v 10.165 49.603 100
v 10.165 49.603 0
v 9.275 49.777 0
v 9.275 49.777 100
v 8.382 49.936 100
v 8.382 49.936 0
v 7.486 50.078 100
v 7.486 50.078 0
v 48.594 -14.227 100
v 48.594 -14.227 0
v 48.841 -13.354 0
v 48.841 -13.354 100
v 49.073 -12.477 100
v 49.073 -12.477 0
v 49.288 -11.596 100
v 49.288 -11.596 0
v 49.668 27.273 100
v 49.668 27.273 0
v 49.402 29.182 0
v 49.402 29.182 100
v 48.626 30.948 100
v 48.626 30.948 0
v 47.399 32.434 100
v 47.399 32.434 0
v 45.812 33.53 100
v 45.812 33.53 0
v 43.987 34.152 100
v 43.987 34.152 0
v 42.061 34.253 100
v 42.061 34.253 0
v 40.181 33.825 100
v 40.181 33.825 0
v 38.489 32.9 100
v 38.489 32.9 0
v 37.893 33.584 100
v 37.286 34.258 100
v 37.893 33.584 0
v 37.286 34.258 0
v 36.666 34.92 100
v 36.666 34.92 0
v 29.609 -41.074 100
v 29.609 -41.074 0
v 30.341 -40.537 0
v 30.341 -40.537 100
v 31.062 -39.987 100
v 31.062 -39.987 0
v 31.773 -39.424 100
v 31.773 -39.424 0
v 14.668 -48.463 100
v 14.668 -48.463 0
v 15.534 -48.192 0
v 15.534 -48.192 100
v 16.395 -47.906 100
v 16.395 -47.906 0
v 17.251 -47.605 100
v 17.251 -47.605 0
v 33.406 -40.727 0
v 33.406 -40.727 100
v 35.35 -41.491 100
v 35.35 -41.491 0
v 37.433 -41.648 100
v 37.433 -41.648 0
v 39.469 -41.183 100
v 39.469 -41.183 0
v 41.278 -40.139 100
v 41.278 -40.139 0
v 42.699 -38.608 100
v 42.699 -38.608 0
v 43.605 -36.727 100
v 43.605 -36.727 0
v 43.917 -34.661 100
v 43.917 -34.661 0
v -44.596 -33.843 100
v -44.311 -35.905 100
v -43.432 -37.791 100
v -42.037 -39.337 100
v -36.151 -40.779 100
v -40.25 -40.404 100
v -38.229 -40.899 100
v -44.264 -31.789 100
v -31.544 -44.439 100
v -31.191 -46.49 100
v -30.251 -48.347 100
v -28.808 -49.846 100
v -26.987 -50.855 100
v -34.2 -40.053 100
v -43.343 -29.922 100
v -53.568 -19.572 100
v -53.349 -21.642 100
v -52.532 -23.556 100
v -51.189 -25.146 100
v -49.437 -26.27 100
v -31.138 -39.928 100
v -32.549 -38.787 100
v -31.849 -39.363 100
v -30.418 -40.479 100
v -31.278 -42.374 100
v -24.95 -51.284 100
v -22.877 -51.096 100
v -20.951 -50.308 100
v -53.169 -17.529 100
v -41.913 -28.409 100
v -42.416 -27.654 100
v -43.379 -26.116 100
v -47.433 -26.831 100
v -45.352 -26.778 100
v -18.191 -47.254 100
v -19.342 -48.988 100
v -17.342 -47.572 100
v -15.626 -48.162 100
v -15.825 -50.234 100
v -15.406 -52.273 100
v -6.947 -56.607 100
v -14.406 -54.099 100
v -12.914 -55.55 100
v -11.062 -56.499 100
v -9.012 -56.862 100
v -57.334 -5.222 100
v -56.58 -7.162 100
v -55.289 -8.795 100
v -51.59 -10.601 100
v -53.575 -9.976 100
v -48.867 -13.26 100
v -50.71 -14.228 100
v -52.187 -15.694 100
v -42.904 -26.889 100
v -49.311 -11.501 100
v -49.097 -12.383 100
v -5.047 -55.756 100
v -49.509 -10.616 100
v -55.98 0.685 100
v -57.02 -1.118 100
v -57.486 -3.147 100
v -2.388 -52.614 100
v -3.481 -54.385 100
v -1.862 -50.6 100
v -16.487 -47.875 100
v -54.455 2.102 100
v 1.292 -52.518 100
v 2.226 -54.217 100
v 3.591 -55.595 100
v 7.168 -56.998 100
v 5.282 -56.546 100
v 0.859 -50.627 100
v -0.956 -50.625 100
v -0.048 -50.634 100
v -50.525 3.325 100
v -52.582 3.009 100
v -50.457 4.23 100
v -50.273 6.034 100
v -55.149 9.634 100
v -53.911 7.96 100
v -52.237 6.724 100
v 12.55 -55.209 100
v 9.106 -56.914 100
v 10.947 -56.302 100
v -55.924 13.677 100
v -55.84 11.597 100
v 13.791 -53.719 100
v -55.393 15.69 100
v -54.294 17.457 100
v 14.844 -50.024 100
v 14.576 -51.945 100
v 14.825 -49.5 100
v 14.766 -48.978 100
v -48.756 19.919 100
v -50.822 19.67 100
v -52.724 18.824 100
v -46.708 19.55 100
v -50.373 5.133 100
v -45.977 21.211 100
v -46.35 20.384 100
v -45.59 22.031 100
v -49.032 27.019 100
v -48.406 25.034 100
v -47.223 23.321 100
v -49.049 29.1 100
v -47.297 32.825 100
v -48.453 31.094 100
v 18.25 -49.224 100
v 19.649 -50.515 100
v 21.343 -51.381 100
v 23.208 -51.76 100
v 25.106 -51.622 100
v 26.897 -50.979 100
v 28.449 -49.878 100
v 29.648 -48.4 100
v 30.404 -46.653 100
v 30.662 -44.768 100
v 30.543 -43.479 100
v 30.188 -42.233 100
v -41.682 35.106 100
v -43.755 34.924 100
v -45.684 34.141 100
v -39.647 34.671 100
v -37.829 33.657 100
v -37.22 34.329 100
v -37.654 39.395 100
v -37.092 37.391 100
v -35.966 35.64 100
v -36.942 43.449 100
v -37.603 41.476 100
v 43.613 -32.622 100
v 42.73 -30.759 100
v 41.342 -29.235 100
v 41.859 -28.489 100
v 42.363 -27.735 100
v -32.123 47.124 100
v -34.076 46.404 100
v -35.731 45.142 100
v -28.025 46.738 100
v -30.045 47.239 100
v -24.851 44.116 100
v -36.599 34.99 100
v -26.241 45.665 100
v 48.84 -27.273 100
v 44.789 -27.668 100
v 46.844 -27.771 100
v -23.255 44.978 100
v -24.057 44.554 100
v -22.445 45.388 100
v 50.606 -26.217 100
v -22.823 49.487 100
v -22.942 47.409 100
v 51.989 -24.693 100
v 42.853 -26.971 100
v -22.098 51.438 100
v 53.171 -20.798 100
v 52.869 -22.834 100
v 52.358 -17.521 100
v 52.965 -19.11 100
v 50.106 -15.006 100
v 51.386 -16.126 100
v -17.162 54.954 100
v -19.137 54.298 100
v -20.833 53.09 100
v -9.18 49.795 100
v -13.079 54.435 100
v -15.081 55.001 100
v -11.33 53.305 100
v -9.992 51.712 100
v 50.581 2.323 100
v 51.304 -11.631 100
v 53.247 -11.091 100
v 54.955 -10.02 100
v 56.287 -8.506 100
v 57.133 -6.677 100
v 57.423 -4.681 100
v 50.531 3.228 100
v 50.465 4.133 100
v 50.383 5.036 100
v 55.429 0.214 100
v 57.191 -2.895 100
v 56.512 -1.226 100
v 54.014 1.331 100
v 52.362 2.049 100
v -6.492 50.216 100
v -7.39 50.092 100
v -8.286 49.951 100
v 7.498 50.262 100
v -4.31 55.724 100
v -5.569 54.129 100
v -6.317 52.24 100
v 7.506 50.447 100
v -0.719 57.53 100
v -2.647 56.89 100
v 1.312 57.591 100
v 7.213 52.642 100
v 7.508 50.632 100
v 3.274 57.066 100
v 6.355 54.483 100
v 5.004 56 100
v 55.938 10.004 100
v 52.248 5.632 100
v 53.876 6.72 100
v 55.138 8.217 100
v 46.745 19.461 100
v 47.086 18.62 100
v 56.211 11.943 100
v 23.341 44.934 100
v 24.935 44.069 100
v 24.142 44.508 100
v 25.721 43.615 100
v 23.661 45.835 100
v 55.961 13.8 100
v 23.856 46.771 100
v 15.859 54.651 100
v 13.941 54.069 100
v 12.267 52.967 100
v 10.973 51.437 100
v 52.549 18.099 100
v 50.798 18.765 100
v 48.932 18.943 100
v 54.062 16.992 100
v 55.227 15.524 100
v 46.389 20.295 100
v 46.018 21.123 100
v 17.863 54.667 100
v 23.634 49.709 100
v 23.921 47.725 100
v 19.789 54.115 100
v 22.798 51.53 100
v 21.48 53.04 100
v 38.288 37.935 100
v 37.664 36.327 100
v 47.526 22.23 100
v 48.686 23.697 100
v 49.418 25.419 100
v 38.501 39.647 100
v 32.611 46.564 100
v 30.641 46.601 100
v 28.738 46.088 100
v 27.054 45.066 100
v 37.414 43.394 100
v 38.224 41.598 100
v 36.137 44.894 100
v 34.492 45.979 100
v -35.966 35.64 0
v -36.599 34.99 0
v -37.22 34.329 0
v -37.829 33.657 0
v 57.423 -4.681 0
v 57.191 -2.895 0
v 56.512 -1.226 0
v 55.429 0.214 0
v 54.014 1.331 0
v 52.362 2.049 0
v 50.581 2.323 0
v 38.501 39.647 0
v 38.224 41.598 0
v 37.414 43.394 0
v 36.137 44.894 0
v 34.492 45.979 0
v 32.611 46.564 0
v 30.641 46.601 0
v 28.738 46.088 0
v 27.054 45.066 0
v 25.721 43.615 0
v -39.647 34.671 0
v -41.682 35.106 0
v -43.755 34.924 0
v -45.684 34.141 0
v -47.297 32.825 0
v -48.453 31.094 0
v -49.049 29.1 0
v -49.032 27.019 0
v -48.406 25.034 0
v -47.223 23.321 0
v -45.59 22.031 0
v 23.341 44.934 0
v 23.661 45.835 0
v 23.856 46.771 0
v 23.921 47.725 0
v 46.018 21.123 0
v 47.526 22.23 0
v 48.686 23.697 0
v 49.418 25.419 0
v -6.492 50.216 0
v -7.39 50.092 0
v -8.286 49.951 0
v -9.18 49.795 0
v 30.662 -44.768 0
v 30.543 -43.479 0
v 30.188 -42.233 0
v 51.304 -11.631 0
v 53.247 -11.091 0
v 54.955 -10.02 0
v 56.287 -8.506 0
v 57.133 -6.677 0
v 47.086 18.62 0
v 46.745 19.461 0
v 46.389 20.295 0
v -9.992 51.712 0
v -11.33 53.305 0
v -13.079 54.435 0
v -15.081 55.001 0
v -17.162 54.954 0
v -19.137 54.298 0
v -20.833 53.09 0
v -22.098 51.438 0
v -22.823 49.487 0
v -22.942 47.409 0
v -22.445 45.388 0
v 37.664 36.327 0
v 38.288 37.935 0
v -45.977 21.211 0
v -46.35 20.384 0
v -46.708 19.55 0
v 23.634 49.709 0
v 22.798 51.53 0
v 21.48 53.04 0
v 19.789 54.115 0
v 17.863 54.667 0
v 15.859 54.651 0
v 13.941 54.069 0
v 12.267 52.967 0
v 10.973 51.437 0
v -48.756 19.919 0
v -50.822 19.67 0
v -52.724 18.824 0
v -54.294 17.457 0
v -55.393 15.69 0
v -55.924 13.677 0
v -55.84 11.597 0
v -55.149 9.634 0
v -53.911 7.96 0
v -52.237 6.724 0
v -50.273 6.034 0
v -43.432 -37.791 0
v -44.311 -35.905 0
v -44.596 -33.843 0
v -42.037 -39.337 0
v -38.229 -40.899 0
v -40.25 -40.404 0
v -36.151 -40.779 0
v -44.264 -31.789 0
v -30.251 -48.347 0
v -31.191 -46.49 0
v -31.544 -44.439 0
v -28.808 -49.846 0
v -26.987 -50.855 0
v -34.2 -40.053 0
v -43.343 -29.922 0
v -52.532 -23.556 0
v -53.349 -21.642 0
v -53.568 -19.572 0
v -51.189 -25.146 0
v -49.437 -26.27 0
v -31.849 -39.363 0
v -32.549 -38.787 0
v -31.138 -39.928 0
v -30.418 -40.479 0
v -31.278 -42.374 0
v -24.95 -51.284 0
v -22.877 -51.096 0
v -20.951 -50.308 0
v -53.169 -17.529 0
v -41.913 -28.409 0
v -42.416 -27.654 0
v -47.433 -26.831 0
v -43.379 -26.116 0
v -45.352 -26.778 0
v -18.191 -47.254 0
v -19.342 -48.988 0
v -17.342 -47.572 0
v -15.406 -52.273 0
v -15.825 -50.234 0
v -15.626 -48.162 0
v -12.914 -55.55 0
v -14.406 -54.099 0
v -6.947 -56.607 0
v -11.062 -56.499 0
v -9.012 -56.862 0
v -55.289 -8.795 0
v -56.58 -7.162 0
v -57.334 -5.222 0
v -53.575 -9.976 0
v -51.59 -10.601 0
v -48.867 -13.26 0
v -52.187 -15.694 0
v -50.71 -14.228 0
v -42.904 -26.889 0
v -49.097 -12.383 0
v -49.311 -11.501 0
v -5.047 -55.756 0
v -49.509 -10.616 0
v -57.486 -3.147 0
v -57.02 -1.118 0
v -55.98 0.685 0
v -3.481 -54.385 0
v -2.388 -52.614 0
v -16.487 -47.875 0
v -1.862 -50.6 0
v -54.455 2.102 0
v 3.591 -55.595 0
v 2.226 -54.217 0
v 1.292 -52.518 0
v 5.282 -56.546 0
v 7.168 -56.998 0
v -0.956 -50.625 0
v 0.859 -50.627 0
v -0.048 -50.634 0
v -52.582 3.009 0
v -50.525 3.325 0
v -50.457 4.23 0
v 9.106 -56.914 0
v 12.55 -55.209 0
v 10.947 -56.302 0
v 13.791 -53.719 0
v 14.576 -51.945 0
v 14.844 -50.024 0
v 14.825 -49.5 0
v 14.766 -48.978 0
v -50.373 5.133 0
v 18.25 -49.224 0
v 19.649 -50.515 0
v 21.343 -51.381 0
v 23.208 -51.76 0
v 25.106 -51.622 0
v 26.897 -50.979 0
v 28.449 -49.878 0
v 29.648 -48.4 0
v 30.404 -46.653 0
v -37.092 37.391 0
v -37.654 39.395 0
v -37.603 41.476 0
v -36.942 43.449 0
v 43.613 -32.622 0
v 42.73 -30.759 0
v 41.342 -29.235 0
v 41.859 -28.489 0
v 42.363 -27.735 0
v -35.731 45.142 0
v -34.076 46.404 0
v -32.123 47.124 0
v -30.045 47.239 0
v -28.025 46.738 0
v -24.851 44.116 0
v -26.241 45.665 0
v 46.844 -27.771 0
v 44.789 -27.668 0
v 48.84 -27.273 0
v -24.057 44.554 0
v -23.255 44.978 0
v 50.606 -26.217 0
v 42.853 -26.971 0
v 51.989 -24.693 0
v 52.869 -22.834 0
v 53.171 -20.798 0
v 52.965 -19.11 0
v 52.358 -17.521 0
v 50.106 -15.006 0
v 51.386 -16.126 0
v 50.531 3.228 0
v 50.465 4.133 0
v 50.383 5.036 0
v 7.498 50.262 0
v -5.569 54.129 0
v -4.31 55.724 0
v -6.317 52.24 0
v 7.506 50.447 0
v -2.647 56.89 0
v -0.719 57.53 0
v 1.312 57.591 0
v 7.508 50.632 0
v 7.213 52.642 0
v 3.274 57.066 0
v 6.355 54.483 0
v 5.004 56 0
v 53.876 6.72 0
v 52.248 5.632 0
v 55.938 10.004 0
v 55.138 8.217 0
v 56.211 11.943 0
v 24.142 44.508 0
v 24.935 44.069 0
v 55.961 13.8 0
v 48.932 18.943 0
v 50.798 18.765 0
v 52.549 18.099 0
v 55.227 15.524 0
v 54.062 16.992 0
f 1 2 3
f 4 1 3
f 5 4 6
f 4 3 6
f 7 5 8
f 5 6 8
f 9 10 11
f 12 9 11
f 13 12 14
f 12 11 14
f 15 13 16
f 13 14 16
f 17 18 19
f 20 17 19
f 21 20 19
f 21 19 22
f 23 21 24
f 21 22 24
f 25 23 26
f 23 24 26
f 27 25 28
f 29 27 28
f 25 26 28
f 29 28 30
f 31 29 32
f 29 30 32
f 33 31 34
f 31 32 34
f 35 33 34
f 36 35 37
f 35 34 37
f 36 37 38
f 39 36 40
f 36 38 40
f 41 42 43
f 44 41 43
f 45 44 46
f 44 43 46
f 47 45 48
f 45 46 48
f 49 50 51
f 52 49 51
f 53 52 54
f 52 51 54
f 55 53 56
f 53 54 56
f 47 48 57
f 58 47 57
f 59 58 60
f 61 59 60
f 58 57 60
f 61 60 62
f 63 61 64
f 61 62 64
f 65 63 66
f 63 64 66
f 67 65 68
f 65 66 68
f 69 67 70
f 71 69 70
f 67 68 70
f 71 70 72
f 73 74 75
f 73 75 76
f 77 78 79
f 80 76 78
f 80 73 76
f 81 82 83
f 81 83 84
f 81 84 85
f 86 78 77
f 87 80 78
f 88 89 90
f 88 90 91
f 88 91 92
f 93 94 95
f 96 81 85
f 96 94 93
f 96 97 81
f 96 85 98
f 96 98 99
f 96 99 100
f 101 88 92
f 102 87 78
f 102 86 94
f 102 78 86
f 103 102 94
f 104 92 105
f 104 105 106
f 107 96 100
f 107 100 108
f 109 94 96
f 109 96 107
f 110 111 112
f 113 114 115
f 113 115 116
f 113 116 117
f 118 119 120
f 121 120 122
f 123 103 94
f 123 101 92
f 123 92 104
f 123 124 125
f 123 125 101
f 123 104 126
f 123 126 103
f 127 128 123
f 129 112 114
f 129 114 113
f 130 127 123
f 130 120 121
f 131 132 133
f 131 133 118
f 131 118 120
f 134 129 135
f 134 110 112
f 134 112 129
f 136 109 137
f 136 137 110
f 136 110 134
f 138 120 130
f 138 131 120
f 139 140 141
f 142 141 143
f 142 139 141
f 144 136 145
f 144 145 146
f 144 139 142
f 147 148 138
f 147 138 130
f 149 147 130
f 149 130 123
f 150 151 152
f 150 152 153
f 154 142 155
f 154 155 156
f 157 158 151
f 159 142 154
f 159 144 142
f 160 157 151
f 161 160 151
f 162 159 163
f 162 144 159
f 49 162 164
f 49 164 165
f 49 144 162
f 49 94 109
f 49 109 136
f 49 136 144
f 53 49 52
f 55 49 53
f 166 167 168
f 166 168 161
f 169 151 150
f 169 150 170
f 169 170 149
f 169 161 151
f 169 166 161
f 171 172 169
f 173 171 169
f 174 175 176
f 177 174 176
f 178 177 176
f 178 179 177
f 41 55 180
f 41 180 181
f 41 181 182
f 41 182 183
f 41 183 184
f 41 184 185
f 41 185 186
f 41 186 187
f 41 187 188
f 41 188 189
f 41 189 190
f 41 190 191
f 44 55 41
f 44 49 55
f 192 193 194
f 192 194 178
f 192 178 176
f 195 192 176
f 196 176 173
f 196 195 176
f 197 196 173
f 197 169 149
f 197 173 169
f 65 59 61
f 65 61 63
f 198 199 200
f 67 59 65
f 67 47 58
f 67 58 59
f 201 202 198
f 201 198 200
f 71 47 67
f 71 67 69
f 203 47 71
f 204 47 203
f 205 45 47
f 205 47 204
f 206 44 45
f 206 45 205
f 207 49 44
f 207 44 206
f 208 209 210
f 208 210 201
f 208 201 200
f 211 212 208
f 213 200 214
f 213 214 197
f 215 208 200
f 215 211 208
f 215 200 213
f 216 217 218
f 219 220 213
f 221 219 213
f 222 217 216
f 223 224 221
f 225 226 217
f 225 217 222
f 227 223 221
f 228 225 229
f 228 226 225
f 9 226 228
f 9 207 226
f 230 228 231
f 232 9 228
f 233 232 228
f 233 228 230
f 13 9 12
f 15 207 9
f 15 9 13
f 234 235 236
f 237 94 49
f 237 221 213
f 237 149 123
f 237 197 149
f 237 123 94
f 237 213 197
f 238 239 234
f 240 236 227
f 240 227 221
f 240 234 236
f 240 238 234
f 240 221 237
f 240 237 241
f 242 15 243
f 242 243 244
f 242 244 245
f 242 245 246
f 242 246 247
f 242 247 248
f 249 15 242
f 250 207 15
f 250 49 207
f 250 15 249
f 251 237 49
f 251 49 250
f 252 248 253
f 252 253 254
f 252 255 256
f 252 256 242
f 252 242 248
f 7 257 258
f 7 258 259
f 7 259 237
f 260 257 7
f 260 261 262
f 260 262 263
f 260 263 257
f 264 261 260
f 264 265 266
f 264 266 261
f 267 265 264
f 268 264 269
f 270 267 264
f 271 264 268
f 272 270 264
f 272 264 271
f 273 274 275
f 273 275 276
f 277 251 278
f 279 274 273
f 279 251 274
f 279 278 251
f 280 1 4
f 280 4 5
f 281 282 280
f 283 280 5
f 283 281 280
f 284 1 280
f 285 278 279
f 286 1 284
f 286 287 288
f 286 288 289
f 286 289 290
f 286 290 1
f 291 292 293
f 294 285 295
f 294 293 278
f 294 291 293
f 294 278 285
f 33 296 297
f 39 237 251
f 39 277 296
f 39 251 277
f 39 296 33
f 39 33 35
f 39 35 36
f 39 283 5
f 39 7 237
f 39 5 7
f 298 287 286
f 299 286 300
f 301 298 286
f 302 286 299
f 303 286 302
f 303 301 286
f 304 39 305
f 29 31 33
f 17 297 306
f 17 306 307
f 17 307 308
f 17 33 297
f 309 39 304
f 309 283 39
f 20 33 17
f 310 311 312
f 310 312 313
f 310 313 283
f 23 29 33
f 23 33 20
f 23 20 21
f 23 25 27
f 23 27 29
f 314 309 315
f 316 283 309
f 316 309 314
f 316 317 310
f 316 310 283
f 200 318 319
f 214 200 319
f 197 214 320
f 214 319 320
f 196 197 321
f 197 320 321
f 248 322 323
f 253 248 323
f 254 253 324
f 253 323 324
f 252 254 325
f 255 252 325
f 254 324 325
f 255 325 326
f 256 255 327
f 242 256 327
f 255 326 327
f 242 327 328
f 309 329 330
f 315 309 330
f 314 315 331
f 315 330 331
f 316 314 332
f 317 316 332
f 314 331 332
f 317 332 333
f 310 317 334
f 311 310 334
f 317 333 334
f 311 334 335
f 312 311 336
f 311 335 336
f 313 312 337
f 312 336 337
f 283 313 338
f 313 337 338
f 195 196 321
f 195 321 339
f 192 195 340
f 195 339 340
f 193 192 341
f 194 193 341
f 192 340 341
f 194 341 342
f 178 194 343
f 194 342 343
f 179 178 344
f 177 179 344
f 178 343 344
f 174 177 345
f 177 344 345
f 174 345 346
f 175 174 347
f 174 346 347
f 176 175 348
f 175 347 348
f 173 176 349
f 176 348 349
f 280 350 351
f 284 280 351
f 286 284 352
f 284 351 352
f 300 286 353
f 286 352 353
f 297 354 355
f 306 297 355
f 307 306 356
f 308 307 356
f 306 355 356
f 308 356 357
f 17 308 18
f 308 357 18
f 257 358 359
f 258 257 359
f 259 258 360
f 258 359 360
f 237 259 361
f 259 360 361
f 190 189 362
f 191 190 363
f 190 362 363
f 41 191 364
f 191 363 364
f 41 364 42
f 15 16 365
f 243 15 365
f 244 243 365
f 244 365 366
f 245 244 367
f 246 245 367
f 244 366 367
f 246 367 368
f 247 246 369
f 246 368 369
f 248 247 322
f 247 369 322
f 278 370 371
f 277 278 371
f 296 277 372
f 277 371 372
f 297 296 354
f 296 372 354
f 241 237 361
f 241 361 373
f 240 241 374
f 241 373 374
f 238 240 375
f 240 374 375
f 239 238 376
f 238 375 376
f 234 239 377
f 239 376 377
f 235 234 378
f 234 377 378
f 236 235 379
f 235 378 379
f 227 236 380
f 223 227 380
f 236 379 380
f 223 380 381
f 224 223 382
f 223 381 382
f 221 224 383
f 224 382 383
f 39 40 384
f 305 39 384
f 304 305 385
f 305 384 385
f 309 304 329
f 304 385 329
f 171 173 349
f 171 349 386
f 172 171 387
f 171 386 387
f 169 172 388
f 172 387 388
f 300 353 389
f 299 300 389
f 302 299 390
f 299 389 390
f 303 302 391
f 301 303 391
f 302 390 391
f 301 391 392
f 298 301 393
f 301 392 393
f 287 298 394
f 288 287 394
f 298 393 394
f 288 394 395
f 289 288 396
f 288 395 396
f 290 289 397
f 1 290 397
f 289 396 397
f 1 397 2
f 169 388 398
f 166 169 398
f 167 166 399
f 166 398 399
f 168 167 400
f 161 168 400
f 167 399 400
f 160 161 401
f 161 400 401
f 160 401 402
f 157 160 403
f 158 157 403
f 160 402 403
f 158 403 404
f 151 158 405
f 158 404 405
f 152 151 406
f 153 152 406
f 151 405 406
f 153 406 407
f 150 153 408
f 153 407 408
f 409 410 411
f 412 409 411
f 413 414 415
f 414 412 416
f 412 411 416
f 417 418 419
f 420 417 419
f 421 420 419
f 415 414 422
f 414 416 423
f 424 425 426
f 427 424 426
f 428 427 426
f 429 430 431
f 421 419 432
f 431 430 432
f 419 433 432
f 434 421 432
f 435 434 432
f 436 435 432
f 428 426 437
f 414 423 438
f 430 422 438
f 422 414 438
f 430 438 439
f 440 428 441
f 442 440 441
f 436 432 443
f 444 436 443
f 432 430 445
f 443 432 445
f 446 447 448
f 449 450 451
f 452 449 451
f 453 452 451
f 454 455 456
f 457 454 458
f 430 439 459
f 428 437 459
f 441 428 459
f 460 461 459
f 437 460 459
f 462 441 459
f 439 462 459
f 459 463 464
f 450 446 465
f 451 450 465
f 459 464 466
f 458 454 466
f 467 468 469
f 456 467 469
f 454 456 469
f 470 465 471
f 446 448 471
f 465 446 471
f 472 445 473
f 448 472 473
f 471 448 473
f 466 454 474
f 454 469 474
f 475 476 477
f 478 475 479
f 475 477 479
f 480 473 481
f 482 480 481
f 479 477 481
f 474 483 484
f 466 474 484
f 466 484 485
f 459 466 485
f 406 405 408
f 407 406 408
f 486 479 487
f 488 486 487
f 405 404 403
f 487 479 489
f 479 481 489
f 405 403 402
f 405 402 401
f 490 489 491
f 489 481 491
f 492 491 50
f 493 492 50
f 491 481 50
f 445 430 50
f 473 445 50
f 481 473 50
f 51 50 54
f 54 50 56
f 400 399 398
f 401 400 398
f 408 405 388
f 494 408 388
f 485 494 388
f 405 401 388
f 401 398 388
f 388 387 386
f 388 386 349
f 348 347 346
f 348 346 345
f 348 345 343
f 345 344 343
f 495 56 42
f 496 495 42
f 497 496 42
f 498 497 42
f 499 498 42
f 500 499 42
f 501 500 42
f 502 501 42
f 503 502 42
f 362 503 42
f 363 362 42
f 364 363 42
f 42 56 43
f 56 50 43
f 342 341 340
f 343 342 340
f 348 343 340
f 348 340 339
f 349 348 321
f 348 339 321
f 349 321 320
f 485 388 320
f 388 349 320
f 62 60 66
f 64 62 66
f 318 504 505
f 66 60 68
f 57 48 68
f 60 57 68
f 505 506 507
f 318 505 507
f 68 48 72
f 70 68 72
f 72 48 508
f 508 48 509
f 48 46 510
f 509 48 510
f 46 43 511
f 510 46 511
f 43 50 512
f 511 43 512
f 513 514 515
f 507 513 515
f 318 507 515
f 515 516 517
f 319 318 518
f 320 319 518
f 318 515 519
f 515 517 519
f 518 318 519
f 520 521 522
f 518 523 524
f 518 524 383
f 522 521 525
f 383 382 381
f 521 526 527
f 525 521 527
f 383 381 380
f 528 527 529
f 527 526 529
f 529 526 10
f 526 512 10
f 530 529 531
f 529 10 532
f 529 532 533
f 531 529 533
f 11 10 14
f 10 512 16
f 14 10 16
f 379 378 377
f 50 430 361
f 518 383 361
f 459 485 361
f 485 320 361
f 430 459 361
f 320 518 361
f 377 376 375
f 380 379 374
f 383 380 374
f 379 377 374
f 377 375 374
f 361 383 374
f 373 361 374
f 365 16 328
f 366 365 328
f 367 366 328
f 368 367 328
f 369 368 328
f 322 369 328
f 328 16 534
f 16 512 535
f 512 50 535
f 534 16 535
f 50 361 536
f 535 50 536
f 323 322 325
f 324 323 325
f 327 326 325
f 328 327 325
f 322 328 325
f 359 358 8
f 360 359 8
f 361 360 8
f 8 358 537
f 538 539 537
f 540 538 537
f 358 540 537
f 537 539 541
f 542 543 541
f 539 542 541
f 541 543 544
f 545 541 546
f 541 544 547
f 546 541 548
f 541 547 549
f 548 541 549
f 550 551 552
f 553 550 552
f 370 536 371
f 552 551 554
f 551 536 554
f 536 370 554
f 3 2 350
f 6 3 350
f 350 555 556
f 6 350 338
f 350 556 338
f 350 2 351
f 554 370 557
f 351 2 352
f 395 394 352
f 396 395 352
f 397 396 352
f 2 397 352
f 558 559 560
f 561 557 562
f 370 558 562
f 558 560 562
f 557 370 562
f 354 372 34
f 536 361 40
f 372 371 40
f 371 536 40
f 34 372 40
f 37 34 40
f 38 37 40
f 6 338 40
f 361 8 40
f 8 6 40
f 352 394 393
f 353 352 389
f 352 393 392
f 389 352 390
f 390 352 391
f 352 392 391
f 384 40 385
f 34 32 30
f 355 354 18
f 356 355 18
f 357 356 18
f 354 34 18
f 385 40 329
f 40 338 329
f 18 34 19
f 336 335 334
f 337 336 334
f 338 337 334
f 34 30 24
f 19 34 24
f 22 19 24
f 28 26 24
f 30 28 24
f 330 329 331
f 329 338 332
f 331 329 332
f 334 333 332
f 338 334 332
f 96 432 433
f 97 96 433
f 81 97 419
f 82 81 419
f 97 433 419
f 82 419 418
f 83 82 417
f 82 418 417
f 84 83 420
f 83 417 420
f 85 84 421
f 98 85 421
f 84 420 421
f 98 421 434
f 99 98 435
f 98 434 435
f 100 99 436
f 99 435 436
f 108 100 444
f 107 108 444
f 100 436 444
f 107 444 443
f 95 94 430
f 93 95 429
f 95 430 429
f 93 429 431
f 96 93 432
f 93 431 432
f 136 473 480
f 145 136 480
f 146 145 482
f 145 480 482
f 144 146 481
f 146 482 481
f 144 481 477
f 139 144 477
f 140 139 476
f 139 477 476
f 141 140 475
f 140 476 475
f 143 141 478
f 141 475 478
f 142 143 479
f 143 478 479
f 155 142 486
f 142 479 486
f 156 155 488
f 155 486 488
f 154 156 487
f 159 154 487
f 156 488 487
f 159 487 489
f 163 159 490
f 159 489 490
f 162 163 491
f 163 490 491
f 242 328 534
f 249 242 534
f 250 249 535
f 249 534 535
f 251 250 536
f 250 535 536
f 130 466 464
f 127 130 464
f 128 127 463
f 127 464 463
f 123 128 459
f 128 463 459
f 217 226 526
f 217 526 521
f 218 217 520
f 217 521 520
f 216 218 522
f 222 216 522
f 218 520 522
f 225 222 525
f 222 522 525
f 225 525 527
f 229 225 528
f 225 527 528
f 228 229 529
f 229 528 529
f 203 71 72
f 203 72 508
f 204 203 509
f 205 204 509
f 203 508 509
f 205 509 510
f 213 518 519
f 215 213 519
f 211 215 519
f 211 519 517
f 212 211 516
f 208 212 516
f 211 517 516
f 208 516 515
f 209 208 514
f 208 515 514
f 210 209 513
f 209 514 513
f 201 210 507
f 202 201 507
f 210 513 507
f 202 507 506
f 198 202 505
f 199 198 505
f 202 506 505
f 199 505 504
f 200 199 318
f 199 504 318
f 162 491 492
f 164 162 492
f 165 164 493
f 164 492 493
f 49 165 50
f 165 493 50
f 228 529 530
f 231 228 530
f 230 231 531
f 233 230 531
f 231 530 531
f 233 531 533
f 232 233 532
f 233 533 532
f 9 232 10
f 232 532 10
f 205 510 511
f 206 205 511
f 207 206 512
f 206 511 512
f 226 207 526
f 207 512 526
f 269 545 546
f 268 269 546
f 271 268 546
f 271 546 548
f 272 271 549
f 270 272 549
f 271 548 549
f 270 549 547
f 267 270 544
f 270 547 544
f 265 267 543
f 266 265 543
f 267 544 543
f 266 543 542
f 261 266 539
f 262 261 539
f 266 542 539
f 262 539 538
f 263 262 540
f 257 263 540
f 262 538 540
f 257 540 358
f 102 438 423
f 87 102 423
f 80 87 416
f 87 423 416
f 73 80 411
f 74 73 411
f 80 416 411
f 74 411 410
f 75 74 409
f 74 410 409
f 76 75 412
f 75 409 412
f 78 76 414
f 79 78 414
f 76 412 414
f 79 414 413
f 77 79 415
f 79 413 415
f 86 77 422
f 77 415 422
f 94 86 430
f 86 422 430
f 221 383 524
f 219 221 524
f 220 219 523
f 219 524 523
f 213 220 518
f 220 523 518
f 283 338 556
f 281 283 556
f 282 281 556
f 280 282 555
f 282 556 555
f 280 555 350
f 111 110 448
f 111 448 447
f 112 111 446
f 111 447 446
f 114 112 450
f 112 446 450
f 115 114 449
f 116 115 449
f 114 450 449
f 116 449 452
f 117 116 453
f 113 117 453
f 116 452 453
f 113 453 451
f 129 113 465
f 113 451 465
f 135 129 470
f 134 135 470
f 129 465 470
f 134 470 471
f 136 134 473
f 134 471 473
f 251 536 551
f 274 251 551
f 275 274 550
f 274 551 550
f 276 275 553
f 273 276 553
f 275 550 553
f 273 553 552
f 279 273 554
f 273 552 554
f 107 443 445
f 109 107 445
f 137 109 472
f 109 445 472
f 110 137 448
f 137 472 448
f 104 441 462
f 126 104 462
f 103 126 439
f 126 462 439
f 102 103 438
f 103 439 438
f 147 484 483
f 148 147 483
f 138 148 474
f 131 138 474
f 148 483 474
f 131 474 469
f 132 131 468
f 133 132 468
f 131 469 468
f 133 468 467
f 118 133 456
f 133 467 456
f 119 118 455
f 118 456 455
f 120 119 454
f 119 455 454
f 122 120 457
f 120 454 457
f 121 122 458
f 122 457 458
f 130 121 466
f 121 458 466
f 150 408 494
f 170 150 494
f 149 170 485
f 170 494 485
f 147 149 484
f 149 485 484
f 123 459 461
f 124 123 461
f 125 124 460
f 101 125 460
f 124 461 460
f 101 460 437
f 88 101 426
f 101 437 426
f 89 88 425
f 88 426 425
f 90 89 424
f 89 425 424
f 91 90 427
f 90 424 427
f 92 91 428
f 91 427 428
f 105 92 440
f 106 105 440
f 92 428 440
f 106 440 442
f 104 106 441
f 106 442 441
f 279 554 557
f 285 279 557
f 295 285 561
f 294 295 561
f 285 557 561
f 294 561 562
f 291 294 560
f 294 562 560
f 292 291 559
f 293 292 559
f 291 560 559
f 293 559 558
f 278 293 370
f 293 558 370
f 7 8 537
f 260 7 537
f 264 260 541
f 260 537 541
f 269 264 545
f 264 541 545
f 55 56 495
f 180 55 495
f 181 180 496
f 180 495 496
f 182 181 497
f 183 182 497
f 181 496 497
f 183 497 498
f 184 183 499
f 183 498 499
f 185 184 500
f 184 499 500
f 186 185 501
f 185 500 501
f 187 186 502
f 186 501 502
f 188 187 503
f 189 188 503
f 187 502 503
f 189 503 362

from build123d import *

# Parameters (mm, degrees)
F1_DEPTH = 100


with BuildPart() as f1:
    # F0 (on Top) → F1 (new body)
    with BuildSketch(Plane.XY):
        with BuildLine():
            ThreePointArc((49.2884179596, -11.5958340243), (50.2965501676, -5.8368272994), (50.6340943603, 0))
            ThreePointArc((50.6340943603, 0), (50.6207684627, 1.161598866), (50.5807977844, 2.3225863122))
            ThreePointArc((50.5807977844, 2.3225863122), (43.4412919228, -4.0336940461), (49.2884179596, -11.5958340243))
        make_face()
        with BuildLine():
            ThreePointArc((50.5807977844, 2.3225863122), (50.6207684627, 1.161598866), (50.6340943603, 0))
            ThreePointArc((50.6340943603, 0), (50.2965501676, -5.8368272994), (49.2884179596, -11.5958340243))
            ThreePointArc((49.2884179596, -11.5958340243), (54.9545502266, -10.0195708321), (57.4231482248, -4.6814359106))
            ThreePointArc((57.4231482248, -4.6814359106), (55.4286593665, 0.2143297815), (50.5807977844, 2.3225863122))
        make_face()
        with BuildLine():
            ThreePointArc((49.2884179596, -11.5958340243), (43.4412919228, -4.0336940461), (50.5807977844, 2.3225863122))
            ThreePointArc((50.5807977844, 2.3225863122), (50.5001299163, 3.6808137845), (50.382996675, 5.0363833974))
            ThreePointArc((50.382996675, 5.0363833974), (42.397261218, 10.2902270524), (47.0860481007, 18.6203003719))
            ThreePointArc((47.0860481007, 18.6203003719), (46.5687353009, 19.8787425195), (46.017795928, 21.1228305304))
            ThreePointArc((46.017795928, 21.1228305304), (36.758829399, 23.4990423804), (38.48879449, 32.9002159627))
            ThreePointArc((38.48879449, 32.9002159627), (37.5908956273, 33.922501052), (36.6658529524, 34.9202912209))
            ThreePointArc((36.6658529524, 34.9202912209), (27.1370080426, 34.1613718412), (25.7206827811, 43.6148826544))
            ThreePointArc((25.7206827811, 43.6148826544), (24.5394991296, 44.2902302337), (23.3405958801, 44.9335965136))
            ThreePointArc((23.3405958801, 44.9335965136), (14.5744707907, 41.1217865948), (10.1653359954, 49.6032000559))
            ThreePointArc((10.1653359954, 49.6032000559), (8.8288671316, 49.8584257358), (7.4860230776, 50.0776494073))
            ThreePointArc((7.4860230776, 50.0776494073), (0.4325634824, 43.6260177006), (-6.4915826769, 50.2162410584))
            ThreePointArc((-6.4915826769, 50.2162410584), (-7.838509614, 50.0236871763), (-9.179776483, 49.795011953))
            ThreePointArc((-9.179776483, 49.795011953), (-9.0146366457, 48.9300740554), (-8.959298633, 48.0512530059))
            ThreePointArc((-8.959298633, 48.0512530059), (-14.6076596491, 41.1781105865), (-22.4450376388, 45.3875731569))
            ThreePointArc((-22.4450376388, 45.3875731569), (-23.656462216, 44.7681059138), (-24.8508048228, 44.1163123044))
            ThreePointArc((-24.8508048228, 44.1163123044), (-23.9912589829, 42.2746668759), (-23.696474734, 40.263801594))
            ThreePointArc((-23.696474734, 40.263801594), (-28.2320691914, 33.7078487551), (-35.966224502, 35.6404574432))
            ThreePointArc((-35.966224502, 35.6404574432), (-36.910870069, 34.6612057267), (-37.8288628601, 33.6569256825))
            ThreePointArc((-37.8288628601, 33.6569256825), (-35.8238617515, 31.2012008735), (-35.1065686444, 28.1131425222))
            ThreePointArc((-35.1065686444, 28.1131425222), (-38.5967809177, 22.0532085671), (-45.5899128668, 22.0311451468))
            ThreePointArc((-45.5899128668, 22.0311451468), (-46.1654124189, 20.7982260752), (-46.7075766311, 19.5502889219))
            ThreePointArc((-46.7075766311, 19.5502889219), (-43.2644592903, 16.9970054766), (-41.9531196433, 12.9159882377))
            ThreePointArc((-41.9531196433, 12.9159882377), (-44.4938494078, 7.5173723677), (-50.2732267722, 6.0344164253))
            ThreePointArc((-50.2732267722, 6.0344164253), (-50.417216003, 4.6814359106), (-50.5247997315, 3.3250750026))
            ThreePointArc((-50.5247997315, 3.3250750026), (-45.5549175223, 1.2818428301), (-43.4941976945, -3.6808137845))
            ThreePointArc((-43.4941976945, -3.6808137845), (-45.2072440334, -8.2708514016), (-49.5086564873, -10.6162349495))
            ThreePointArc((-49.5086564873, -10.6162349495), (-49.2055319295, -11.9426604748), (-48.8668768079, -13.2604623871))
            ThreePointArc((-48.8668768079, -13.2604623871), (-42.5077955906, -14.1698148649), (-39.5628030791, -19.8787425195))
            ThreePointArc((-39.5628030791, -19.8787425195), (-40.5925421217, -23.5349976229), (-43.3790550661, -26.1164525397))
            ThreePointArc((-43.3790550661, -26.1164525397), (-42.6616649689, -27.2725842883), (-41.9134695345, -28.4090229199))
            ThreePointArc((-41.9134695345, -28.4090229199), (-34.5250004498, -27.6230270218), (-30.5849634055, -33.922501052))
            ThreePointArc((-30.5849634055, -33.922501052), (-31.0944101229, -36.5452405336), (-32.548659933, -38.7865472586))
            ThreePointArc((-32.548659933, -38.7865472586), (-31.494744645, -39.6471004164), (-30.4180874825, -40.4790250079))
            ThreePointArc((-30.4180874825, -40.4790250079), (-22.5522781132, -37.5720430579), (-17.5335669078, -44.2902302337))
            ThreePointArc((-17.5335669078, -44.2902302337), (-17.6999284896, -45.8079125974), (-18.1911124518, -47.2535177468))
            ThreePointArc((-18.1911124518, -47.2535177468), (-16.9148800475, -47.7252380262), (-15.6264336665, -48.1624966395))
            ThreePointArc((-15.6264336665, -48.1624966395), (-7.9745264854, -42.9047800477), (-1.8229349098, -49.8584257358))
            ThreePointArc((-1.8229349098, -49.8584257358), (-1.8327770136, -50.229652563), (-1.8622756721, -50.5998363733))
            ThreePointArc((-1.8622756721, -50.5998363733), (-0.5020257355, -50.6316055626), (0.8585867063, -50.6268144421))
            ThreePointArc((0.8585867063, -50.6268144421), (6.7539426287, -43.1022132906), (14.6683675727, -48.4628775913))
            ThreePointArc((14.6683675727, -48.4628775913), (15.9652308548, -48.0512530059), (17.2505658872, -47.6049313439))
            ThreePointArc((17.2505658872, -47.6049313439), (20.3832611647, -38.5738148991), (29.6094655879, -41.0742140434))
            ThreePointArc((29.6094655879, -41.0742140434), (30.7024069558, -40.263801594), (31.7731785841, -39.424315268))
            ThreePointArc((31.7731785841, -39.424315268), (31.8037370746, -29.8653451289), (41.3419185685, -29.2345220717))
            ThreePointArc((41.3419185685, -29.2345220717), (42.1125008662, -28.1131425222), (42.8526743697, -26.9714629015))
            ThreePointArc((42.8526743697, -26.9714629015), (39.7777845866, -17.9205018054), (48.5943331862, -14.2268160132))
            ThreePointArc((48.5943331862, -14.2268160132), (48.9590518651, -12.9159882377), (49.2884179596, -11.5958340243))
        make_face()
        with BuildLine():
            ThreePointArc((47.0860481007, 18.6203003719), (42.397261218, 10.2902270524), (50.382996675, 5.0363833974))
            ThreePointArc((50.382996675, 5.0363833974), (49.2055319295, 11.9426604748), (47.0860481007, 18.6203003719))
        make_face()
        with BuildLine():
            ThreePointArc((47.0860481007, 18.6203003719), (49.2055319295, 11.9426604748), (50.382996675, 5.0363833974))
            ThreePointArc((50.382996675, 5.0363833974), (54.5596109585, 7.4241514233), (56.2114641513, 11.9426604748))
            ThreePointArc((56.2114641513, 11.9426604748), (53.3428091892, 17.5965107711), (47.0860481007, 18.6203003719))
        make_face()
        with BuildLine():
            ThreePointArc((53.1713446407, -20.7982260752), (51.914322775, -16.7940887131), (48.5943331862, -14.2268160132))
            ThreePointArc((48.5943331862, -14.2268160132), (46.1654124189, -20.7982260752), (42.8526743697, -26.9714629015))
            ThreePointArc((42.8526743697, -26.9714629015), (49.7622351874, -26.8103764616), (53.1713446407, -20.7982260752))
        make_face()
        with BuildLine():
            ThreePointArc((42.8526743697, -26.9714629015), (46.1654124189, -20.7982260752), (48.5943331862, -14.2268160132))
            ThreePointArc((48.5943331862, -14.2268160132), (39.7777845866, -17.9205018054), (42.8526743697, -26.9714629015))
        make_face()
        with BuildLine():
            ThreePointArc((38.48879449, 32.9002159627), (36.758829399, 23.4990423804), (46.017795928, 21.1228305304))
            ThreePointArc((46.017795928, 21.1228305304), (42.6616649689, 27.2725842883), (38.48879449, 32.9002159627))
        make_face()
        with BuildLine():
            ThreePointArc((38.48879449, 32.9002159627), (42.6616649689, 27.2725842883), (46.017795928, 21.1228305304))
            ThreePointArc((46.017795928, 21.1228305304), (48.6864434845, 23.696954255), (49.6675971907, 27.2725842883))
            ThreePointArc((49.6675971907, 27.2725842883), (45.8119219863, 33.5302968912), (38.48879449, 32.9002159627))
        make_face()
        with BuildLine():
            ThreePointArc((43.9168022908, -34.6612057267), (43.2404321295, -31.6579191239), (41.3419185685, -29.2345220717))
            ThreePointArc((41.3419185685, -29.2345220717), (36.910870069, -34.6612057267), (31.7731785841, -39.424315268))
            ThreePointArc((31.7731785841, -39.424315268), (39.4690694335, -41.183375788), (43.9168022908, -34.6612057267))
        make_face()
        with BuildLine():
            ThreePointArc((31.7731785841, -39.424315268), (36.910870069, -34.6612057267), (41.3419185685, -29.2345220717))
            ThreePointArc((41.3419185685, -29.2345220717), (31.8037370746, -29.8653451289), (31.7731785841, -39.424315268))
        make_face()
        with BuildLine():
            ThreePointArc((25.7206827811, 43.6148826544), (27.1370080426, 34.1613718412), (36.6658529524, 34.9202912209))
            ThreePointArc((36.6658529524, 34.9202912209), (31.494744645, 39.6471004164), (25.7206827811, 43.6148826544))
        make_face()
        with BuildLine():
            ThreePointArc((25.7206827811, 43.6148826544), (31.494744645, 39.6471004164), (36.6658529524, 34.9202912209))
            ThreePointArc((36.6658529524, 34.9202912209), (38.0258823947, 37.1118832675), (38.5006768668, 39.6471004164))
            ThreePointArc((38.5006768668, 39.6471004164), (33.5720506207, 46.3379812388), (25.7206827811, 43.6148826544))
        make_face()
        with BuildLine():
            ThreePointArc((30.6623944378, -44.7681059138), (30.3940220279, -42.8475918997), (29.6094655879, -41.0742140434))
            ThreePointArc((29.6094655879, -41.0742140434), (23.656462216, -44.7681059138), (17.2505658872, -47.6049313439))
            ThreePointArc((17.2505658872, -47.6049313439), (25.1062571665, -51.6223878527), (30.6623944378, -44.7681059138))
        make_face()
        with BuildLine():
            ThreePointArc((17.2505658872, -47.6049313439), (23.656462216, -44.7681059138), (29.6094655879, -41.0742140434))
            ThreePointArc((29.6094655879, -41.0742140434), (20.3832611647, -38.5738148991), (17.2505658872, -47.6049313439))
        make_face()
        with BuildLine():
            ThreePointArc((10.1653359954, 49.6032000559), (14.5744707907, 41.1217865948), (23.3405958801, 44.9335965136))
            ThreePointArc((23.3405958801, 44.9335965136), (16.9148800475, 47.7252380262), (10.1653359954, 49.6032000559))
        make_face()
        with BuildLine():
            ThreePointArc((10.1653359954, 49.6032000559), (16.9148800475, 47.7252380262), (23.3405958801, 44.9335965136))
            ThreePointArc((23.3405958801, 44.9335965136), (23.7742246188, 46.2995878769), (23.9208122693, 47.7252380262))
            ThreePointArc((23.9208122693, 47.7252380262), (17.8625714897, 54.6667772811), (10.1653359954, 49.6032000559))
        make_face()
        with BuildLine():
            ThreePointArc((14.8444418358, -50.0236871763), (14.8002841091, -49.2383323669), (14.6683675727, -48.4628775913))
            ThreePointArc((14.6683675727, -48.4628775913), (7.838509614, -50.0236871763), (0.8585867063, -50.6268144421))
            ThreePointArc((0.8585867063, -50.6268144421), (8.1403535237, -57.0231140493), (14.8444418358, -50.0236871763))
        make_face()
        with BuildLine():
            ThreePointArc((0.8585867063, -50.6268144421), (7.838509614, -50.0236871763), (14.6683675727, -48.4628775913))
            ThreePointArc((14.6683675727, -48.4628775913), (6.7539426287, -43.1022132906), (0.8585867063, -50.6268144421))
        make_face()
        with BuildLine():
            ThreePointArc((-6.4915826769, 50.2162410584), (0.4325634824, 43.6260177006), (7.4860230776, 50.0776494073))
            ThreePointArc((7.4860230776, 50.0776494073), (0.5020257355, 50.6316055626), (-6.4915826769, 50.2162410584))
        make_face()
        with BuildLine():
            ThreePointArc((-6.4915826769, 50.2162410584), (0.5020257355, 50.6316055626), (7.4860230776, 50.0776494073))
            ThreePointArc((7.4860230776, 50.0776494073), (7.5024720895, 50.3544104324), (7.5079579573, 50.6316055626))
            ThreePointArc((7.5079579573, 50.6316055626), (0.294252092, 57.6344561543), (-6.4915826769, 50.2162410584))
        make_face()
        with BuildLine():
            ThreePointArc((-15.6264336665, -48.1624966395), (-10.0504638739, -56.7570333994), (-1.8622756721, -50.5998363733))
            ThreePointArc((-1.8622756721, -50.5998363733), (-8.8288671316, -49.8584257358), (-15.6264336665, -48.1624966395))
        make_face()
        with BuildLine():
            ThreePointArc((-15.6264336665, -48.1624966395), (-8.8288671316, -49.8584257358), (-1.8622756721, -50.5998363733))
            ThreePointArc((-1.8622756721, -50.5998363733), (-1.8327770136, -50.229652563), (-1.8229349098, -49.8584257358))
            ThreePointArc((-1.8229349098, -49.8584257358), (-7.9745264854, -42.9047800477), (-15.6264336665, -48.1624966395))
        make_face()
        with BuildLine():
            ThreePointArc((-8.959298633, 48.0512530059), (-9.0146366457, 48.9300740554), (-9.179776483, 49.795011953))
            ThreePointArc((-9.179776483, 49.795011953), (-15.9652308548, 48.0512530059), (-22.4450376388, 45.3875731569))
            ThreePointArc((-22.4450376388, 45.3875731569), (-14.6076596491, 41.1781105865), (-8.959298633, 48.0512530059))
        make_face()
        with BuildLine():
            ThreePointArc((-22.4450376388, 45.3875731569), (-15.9652308548, 48.0512530059), (-9.179776483, 49.795011953))
            ThreePointArc((-9.179776483, 49.795011953), (-18.1742429184, 54.6998131507), (-22.4450376388, 45.3875731569))
        make_face()
        with BuildLine():
            ThreePointArc((-30.4180874825, -40.4790250079), (-27.9348806374, -50.4184004918), (-18.1911124518, -47.2535177468))
            ThreePointArc((-18.1911124518, -47.2535177468), (-24.5394991296, -44.2902302337), (-30.4180874825, -40.4790250079))
        make_face()
        with BuildLine():
            ThreePointArc((-30.4180874825, -40.4790250079), (-24.5394991296, -44.2902302337), (-18.1911124518, -47.2535177468))
            ThreePointArc((-18.1911124518, -47.2535177468), (-17.6999284896, -45.8079125974), (-17.5335669078, -44.2902302337))
            ThreePointArc((-17.5335669078, -44.2902302337), (-22.5522781132, -37.5720430579), (-30.4180874825, -40.4790250079))
        make_face()
        with BuildLine():
            ThreePointArc((-23.696474734, 40.263801594), (-23.9912589829, 42.2746668759), (-24.8508048228, 44.1163123044))
            ThreePointArc((-24.8508048228, 44.1163123044), (-30.7024069558, 40.263801594), (-35.966224502, 35.6404574432))
            ThreePointArc((-35.966224502, 35.6404574432), (-28.2320691914, 33.7078487551), (-23.696474734, 40.263801594))
        make_face()
        with BuildLine():
            ThreePointArc((-35.966224502, 35.6404574432), (-30.7024069558, 40.263801594), (-24.8508048228, 44.1163123044))
            ThreePointArc((-24.8508048228, 44.1163123044), (-34.9505126027, 45.8348593669), (-35.966224502, 35.6404574432))
        make_face()
        with BuildLine():
            ThreePointArc((-41.9134695345, -28.4090229199), (-42.7921196296, -38.6161515688), (-32.548659933, -38.7865472586))
            ThreePointArc((-32.548659933, -38.7865472586), (-37.5908956273, -33.922501052), (-41.9134695345, -28.4090229199))
        make_face()
        with BuildLine():
            ThreePointArc((-41.9134695345, -28.4090229199), (-37.5908956273, -33.922501052), (-32.548659933, -38.7865472586))
            ThreePointArc((-32.548659933, -38.7865472586), (-31.0944101229, -36.5452405336), (-30.5849634055, -33.922501052))
            ThreePointArc((-30.5849634055, -33.922501052), (-34.5250004498, -27.6230270218), (-41.9134695345, -28.4090229199))
        make_face()
        with BuildLine():
            ThreePointArc((-35.1065686444, 28.1131425222), (-35.8238617515, 31.2012008735), (-37.8288628601, 33.6569256825))
            ThreePointArc((-37.8288628601, 33.6569256825), (-42.1125008662, 28.1131425222), (-45.5899128668, 22.0311451468))
            ThreePointArc((-45.5899128668, 22.0311451468), (-38.5967809177, 22.0532085671), (-35.1065686444, 28.1131425222))
        make_face()
        with BuildLine():
            ThreePointArc((-45.5899128668, 22.0311451468), (-42.1125008662, 28.1131425222), (-37.8288628601, 33.6569256825))
            ThreePointArc((-37.8288628601, 33.6569256825), (-47.9393519334, 32.0029873696), (-45.5899128668, 22.0311451468))
        make_face()
        with BuildLine():
            ThreePointArc((-48.8668768079, -13.2604623871), (-53.0121684717, -22.6292434321), (-43.3790550661, -26.1164525397))
            ThreePointArc((-43.3790550661, -26.1164525397), (-46.5687353009, -19.8787425195), (-48.8668768079, -13.2604623871))
        make_face()
        with BuildLine():
            ThreePointArc((-48.8668768079, -13.2604623871), (-46.5687353009, -19.8787425195), (-43.3790550661, -26.1164525397))
            ThreePointArc((-43.3790550661, -26.1164525397), (-40.5925421217, -23.5349976229), (-39.5628030791, -19.8787425195))
            ThreePointArc((-39.5628030791, -19.8787425195), (-42.5077955906, -14.1698148649), (-48.8668768079, -13.2604623871))
        make_face()
        with BuildLine():
            ThreePointArc((-41.9531196433, 12.9159882377), (-43.2644592903, 16.9970054766), (-46.7075766311, 19.5502889219))
            ThreePointArc((-46.7075766311, 19.5502889219), (-48.9590518651, 12.9159882377), (-50.2732267722, 6.0344164253))
            ThreePointArc((-50.2732267722, 6.0344164253), (-44.4938494078, 7.5173723677), (-41.9531196433, 12.9159882377))
        make_face()
        with BuildLine():
            ThreePointArc((-50.2732267722, 6.0344164253), (-48.9590518651, 12.9159882377), (-46.7075766311, 19.5502889219))
            ThreePointArc((-46.7075766311, 19.5502889219), (-55.7332186265, 14.7030951133), (-50.2732267722, 6.0344164253))
        make_face()
        with BuildLine():
            ThreePointArc((-50.5247997315, 3.3250750026), (-57.4875262914, -4.1901056405), (-49.5086564873, -10.6162349495))
            ThreePointArc((-49.5086564873, -10.6162349495), (-50.5001299163, -3.6808137845), (-50.5247997315, 3.3250750026))
        make_face()
        with BuildLine():
            ThreePointArc((-50.5247997315, 3.3250750026), (-50.5001299163, -3.6808137845), (-49.5086564873, -10.6162349495))
            ThreePointArc((-49.5086564873, -10.6162349495), (-45.2072440334, -8.2708514016), (-43.4941976945, -3.6808137845))
            ThreePointArc((-43.4941976945, -3.6808137845), (-45.5549175223, 1.2818428301), (-50.5247997315, 3.3250750026))
        make_face()
    extrude(amount=F1_DEPTH)


solid = f1.part
